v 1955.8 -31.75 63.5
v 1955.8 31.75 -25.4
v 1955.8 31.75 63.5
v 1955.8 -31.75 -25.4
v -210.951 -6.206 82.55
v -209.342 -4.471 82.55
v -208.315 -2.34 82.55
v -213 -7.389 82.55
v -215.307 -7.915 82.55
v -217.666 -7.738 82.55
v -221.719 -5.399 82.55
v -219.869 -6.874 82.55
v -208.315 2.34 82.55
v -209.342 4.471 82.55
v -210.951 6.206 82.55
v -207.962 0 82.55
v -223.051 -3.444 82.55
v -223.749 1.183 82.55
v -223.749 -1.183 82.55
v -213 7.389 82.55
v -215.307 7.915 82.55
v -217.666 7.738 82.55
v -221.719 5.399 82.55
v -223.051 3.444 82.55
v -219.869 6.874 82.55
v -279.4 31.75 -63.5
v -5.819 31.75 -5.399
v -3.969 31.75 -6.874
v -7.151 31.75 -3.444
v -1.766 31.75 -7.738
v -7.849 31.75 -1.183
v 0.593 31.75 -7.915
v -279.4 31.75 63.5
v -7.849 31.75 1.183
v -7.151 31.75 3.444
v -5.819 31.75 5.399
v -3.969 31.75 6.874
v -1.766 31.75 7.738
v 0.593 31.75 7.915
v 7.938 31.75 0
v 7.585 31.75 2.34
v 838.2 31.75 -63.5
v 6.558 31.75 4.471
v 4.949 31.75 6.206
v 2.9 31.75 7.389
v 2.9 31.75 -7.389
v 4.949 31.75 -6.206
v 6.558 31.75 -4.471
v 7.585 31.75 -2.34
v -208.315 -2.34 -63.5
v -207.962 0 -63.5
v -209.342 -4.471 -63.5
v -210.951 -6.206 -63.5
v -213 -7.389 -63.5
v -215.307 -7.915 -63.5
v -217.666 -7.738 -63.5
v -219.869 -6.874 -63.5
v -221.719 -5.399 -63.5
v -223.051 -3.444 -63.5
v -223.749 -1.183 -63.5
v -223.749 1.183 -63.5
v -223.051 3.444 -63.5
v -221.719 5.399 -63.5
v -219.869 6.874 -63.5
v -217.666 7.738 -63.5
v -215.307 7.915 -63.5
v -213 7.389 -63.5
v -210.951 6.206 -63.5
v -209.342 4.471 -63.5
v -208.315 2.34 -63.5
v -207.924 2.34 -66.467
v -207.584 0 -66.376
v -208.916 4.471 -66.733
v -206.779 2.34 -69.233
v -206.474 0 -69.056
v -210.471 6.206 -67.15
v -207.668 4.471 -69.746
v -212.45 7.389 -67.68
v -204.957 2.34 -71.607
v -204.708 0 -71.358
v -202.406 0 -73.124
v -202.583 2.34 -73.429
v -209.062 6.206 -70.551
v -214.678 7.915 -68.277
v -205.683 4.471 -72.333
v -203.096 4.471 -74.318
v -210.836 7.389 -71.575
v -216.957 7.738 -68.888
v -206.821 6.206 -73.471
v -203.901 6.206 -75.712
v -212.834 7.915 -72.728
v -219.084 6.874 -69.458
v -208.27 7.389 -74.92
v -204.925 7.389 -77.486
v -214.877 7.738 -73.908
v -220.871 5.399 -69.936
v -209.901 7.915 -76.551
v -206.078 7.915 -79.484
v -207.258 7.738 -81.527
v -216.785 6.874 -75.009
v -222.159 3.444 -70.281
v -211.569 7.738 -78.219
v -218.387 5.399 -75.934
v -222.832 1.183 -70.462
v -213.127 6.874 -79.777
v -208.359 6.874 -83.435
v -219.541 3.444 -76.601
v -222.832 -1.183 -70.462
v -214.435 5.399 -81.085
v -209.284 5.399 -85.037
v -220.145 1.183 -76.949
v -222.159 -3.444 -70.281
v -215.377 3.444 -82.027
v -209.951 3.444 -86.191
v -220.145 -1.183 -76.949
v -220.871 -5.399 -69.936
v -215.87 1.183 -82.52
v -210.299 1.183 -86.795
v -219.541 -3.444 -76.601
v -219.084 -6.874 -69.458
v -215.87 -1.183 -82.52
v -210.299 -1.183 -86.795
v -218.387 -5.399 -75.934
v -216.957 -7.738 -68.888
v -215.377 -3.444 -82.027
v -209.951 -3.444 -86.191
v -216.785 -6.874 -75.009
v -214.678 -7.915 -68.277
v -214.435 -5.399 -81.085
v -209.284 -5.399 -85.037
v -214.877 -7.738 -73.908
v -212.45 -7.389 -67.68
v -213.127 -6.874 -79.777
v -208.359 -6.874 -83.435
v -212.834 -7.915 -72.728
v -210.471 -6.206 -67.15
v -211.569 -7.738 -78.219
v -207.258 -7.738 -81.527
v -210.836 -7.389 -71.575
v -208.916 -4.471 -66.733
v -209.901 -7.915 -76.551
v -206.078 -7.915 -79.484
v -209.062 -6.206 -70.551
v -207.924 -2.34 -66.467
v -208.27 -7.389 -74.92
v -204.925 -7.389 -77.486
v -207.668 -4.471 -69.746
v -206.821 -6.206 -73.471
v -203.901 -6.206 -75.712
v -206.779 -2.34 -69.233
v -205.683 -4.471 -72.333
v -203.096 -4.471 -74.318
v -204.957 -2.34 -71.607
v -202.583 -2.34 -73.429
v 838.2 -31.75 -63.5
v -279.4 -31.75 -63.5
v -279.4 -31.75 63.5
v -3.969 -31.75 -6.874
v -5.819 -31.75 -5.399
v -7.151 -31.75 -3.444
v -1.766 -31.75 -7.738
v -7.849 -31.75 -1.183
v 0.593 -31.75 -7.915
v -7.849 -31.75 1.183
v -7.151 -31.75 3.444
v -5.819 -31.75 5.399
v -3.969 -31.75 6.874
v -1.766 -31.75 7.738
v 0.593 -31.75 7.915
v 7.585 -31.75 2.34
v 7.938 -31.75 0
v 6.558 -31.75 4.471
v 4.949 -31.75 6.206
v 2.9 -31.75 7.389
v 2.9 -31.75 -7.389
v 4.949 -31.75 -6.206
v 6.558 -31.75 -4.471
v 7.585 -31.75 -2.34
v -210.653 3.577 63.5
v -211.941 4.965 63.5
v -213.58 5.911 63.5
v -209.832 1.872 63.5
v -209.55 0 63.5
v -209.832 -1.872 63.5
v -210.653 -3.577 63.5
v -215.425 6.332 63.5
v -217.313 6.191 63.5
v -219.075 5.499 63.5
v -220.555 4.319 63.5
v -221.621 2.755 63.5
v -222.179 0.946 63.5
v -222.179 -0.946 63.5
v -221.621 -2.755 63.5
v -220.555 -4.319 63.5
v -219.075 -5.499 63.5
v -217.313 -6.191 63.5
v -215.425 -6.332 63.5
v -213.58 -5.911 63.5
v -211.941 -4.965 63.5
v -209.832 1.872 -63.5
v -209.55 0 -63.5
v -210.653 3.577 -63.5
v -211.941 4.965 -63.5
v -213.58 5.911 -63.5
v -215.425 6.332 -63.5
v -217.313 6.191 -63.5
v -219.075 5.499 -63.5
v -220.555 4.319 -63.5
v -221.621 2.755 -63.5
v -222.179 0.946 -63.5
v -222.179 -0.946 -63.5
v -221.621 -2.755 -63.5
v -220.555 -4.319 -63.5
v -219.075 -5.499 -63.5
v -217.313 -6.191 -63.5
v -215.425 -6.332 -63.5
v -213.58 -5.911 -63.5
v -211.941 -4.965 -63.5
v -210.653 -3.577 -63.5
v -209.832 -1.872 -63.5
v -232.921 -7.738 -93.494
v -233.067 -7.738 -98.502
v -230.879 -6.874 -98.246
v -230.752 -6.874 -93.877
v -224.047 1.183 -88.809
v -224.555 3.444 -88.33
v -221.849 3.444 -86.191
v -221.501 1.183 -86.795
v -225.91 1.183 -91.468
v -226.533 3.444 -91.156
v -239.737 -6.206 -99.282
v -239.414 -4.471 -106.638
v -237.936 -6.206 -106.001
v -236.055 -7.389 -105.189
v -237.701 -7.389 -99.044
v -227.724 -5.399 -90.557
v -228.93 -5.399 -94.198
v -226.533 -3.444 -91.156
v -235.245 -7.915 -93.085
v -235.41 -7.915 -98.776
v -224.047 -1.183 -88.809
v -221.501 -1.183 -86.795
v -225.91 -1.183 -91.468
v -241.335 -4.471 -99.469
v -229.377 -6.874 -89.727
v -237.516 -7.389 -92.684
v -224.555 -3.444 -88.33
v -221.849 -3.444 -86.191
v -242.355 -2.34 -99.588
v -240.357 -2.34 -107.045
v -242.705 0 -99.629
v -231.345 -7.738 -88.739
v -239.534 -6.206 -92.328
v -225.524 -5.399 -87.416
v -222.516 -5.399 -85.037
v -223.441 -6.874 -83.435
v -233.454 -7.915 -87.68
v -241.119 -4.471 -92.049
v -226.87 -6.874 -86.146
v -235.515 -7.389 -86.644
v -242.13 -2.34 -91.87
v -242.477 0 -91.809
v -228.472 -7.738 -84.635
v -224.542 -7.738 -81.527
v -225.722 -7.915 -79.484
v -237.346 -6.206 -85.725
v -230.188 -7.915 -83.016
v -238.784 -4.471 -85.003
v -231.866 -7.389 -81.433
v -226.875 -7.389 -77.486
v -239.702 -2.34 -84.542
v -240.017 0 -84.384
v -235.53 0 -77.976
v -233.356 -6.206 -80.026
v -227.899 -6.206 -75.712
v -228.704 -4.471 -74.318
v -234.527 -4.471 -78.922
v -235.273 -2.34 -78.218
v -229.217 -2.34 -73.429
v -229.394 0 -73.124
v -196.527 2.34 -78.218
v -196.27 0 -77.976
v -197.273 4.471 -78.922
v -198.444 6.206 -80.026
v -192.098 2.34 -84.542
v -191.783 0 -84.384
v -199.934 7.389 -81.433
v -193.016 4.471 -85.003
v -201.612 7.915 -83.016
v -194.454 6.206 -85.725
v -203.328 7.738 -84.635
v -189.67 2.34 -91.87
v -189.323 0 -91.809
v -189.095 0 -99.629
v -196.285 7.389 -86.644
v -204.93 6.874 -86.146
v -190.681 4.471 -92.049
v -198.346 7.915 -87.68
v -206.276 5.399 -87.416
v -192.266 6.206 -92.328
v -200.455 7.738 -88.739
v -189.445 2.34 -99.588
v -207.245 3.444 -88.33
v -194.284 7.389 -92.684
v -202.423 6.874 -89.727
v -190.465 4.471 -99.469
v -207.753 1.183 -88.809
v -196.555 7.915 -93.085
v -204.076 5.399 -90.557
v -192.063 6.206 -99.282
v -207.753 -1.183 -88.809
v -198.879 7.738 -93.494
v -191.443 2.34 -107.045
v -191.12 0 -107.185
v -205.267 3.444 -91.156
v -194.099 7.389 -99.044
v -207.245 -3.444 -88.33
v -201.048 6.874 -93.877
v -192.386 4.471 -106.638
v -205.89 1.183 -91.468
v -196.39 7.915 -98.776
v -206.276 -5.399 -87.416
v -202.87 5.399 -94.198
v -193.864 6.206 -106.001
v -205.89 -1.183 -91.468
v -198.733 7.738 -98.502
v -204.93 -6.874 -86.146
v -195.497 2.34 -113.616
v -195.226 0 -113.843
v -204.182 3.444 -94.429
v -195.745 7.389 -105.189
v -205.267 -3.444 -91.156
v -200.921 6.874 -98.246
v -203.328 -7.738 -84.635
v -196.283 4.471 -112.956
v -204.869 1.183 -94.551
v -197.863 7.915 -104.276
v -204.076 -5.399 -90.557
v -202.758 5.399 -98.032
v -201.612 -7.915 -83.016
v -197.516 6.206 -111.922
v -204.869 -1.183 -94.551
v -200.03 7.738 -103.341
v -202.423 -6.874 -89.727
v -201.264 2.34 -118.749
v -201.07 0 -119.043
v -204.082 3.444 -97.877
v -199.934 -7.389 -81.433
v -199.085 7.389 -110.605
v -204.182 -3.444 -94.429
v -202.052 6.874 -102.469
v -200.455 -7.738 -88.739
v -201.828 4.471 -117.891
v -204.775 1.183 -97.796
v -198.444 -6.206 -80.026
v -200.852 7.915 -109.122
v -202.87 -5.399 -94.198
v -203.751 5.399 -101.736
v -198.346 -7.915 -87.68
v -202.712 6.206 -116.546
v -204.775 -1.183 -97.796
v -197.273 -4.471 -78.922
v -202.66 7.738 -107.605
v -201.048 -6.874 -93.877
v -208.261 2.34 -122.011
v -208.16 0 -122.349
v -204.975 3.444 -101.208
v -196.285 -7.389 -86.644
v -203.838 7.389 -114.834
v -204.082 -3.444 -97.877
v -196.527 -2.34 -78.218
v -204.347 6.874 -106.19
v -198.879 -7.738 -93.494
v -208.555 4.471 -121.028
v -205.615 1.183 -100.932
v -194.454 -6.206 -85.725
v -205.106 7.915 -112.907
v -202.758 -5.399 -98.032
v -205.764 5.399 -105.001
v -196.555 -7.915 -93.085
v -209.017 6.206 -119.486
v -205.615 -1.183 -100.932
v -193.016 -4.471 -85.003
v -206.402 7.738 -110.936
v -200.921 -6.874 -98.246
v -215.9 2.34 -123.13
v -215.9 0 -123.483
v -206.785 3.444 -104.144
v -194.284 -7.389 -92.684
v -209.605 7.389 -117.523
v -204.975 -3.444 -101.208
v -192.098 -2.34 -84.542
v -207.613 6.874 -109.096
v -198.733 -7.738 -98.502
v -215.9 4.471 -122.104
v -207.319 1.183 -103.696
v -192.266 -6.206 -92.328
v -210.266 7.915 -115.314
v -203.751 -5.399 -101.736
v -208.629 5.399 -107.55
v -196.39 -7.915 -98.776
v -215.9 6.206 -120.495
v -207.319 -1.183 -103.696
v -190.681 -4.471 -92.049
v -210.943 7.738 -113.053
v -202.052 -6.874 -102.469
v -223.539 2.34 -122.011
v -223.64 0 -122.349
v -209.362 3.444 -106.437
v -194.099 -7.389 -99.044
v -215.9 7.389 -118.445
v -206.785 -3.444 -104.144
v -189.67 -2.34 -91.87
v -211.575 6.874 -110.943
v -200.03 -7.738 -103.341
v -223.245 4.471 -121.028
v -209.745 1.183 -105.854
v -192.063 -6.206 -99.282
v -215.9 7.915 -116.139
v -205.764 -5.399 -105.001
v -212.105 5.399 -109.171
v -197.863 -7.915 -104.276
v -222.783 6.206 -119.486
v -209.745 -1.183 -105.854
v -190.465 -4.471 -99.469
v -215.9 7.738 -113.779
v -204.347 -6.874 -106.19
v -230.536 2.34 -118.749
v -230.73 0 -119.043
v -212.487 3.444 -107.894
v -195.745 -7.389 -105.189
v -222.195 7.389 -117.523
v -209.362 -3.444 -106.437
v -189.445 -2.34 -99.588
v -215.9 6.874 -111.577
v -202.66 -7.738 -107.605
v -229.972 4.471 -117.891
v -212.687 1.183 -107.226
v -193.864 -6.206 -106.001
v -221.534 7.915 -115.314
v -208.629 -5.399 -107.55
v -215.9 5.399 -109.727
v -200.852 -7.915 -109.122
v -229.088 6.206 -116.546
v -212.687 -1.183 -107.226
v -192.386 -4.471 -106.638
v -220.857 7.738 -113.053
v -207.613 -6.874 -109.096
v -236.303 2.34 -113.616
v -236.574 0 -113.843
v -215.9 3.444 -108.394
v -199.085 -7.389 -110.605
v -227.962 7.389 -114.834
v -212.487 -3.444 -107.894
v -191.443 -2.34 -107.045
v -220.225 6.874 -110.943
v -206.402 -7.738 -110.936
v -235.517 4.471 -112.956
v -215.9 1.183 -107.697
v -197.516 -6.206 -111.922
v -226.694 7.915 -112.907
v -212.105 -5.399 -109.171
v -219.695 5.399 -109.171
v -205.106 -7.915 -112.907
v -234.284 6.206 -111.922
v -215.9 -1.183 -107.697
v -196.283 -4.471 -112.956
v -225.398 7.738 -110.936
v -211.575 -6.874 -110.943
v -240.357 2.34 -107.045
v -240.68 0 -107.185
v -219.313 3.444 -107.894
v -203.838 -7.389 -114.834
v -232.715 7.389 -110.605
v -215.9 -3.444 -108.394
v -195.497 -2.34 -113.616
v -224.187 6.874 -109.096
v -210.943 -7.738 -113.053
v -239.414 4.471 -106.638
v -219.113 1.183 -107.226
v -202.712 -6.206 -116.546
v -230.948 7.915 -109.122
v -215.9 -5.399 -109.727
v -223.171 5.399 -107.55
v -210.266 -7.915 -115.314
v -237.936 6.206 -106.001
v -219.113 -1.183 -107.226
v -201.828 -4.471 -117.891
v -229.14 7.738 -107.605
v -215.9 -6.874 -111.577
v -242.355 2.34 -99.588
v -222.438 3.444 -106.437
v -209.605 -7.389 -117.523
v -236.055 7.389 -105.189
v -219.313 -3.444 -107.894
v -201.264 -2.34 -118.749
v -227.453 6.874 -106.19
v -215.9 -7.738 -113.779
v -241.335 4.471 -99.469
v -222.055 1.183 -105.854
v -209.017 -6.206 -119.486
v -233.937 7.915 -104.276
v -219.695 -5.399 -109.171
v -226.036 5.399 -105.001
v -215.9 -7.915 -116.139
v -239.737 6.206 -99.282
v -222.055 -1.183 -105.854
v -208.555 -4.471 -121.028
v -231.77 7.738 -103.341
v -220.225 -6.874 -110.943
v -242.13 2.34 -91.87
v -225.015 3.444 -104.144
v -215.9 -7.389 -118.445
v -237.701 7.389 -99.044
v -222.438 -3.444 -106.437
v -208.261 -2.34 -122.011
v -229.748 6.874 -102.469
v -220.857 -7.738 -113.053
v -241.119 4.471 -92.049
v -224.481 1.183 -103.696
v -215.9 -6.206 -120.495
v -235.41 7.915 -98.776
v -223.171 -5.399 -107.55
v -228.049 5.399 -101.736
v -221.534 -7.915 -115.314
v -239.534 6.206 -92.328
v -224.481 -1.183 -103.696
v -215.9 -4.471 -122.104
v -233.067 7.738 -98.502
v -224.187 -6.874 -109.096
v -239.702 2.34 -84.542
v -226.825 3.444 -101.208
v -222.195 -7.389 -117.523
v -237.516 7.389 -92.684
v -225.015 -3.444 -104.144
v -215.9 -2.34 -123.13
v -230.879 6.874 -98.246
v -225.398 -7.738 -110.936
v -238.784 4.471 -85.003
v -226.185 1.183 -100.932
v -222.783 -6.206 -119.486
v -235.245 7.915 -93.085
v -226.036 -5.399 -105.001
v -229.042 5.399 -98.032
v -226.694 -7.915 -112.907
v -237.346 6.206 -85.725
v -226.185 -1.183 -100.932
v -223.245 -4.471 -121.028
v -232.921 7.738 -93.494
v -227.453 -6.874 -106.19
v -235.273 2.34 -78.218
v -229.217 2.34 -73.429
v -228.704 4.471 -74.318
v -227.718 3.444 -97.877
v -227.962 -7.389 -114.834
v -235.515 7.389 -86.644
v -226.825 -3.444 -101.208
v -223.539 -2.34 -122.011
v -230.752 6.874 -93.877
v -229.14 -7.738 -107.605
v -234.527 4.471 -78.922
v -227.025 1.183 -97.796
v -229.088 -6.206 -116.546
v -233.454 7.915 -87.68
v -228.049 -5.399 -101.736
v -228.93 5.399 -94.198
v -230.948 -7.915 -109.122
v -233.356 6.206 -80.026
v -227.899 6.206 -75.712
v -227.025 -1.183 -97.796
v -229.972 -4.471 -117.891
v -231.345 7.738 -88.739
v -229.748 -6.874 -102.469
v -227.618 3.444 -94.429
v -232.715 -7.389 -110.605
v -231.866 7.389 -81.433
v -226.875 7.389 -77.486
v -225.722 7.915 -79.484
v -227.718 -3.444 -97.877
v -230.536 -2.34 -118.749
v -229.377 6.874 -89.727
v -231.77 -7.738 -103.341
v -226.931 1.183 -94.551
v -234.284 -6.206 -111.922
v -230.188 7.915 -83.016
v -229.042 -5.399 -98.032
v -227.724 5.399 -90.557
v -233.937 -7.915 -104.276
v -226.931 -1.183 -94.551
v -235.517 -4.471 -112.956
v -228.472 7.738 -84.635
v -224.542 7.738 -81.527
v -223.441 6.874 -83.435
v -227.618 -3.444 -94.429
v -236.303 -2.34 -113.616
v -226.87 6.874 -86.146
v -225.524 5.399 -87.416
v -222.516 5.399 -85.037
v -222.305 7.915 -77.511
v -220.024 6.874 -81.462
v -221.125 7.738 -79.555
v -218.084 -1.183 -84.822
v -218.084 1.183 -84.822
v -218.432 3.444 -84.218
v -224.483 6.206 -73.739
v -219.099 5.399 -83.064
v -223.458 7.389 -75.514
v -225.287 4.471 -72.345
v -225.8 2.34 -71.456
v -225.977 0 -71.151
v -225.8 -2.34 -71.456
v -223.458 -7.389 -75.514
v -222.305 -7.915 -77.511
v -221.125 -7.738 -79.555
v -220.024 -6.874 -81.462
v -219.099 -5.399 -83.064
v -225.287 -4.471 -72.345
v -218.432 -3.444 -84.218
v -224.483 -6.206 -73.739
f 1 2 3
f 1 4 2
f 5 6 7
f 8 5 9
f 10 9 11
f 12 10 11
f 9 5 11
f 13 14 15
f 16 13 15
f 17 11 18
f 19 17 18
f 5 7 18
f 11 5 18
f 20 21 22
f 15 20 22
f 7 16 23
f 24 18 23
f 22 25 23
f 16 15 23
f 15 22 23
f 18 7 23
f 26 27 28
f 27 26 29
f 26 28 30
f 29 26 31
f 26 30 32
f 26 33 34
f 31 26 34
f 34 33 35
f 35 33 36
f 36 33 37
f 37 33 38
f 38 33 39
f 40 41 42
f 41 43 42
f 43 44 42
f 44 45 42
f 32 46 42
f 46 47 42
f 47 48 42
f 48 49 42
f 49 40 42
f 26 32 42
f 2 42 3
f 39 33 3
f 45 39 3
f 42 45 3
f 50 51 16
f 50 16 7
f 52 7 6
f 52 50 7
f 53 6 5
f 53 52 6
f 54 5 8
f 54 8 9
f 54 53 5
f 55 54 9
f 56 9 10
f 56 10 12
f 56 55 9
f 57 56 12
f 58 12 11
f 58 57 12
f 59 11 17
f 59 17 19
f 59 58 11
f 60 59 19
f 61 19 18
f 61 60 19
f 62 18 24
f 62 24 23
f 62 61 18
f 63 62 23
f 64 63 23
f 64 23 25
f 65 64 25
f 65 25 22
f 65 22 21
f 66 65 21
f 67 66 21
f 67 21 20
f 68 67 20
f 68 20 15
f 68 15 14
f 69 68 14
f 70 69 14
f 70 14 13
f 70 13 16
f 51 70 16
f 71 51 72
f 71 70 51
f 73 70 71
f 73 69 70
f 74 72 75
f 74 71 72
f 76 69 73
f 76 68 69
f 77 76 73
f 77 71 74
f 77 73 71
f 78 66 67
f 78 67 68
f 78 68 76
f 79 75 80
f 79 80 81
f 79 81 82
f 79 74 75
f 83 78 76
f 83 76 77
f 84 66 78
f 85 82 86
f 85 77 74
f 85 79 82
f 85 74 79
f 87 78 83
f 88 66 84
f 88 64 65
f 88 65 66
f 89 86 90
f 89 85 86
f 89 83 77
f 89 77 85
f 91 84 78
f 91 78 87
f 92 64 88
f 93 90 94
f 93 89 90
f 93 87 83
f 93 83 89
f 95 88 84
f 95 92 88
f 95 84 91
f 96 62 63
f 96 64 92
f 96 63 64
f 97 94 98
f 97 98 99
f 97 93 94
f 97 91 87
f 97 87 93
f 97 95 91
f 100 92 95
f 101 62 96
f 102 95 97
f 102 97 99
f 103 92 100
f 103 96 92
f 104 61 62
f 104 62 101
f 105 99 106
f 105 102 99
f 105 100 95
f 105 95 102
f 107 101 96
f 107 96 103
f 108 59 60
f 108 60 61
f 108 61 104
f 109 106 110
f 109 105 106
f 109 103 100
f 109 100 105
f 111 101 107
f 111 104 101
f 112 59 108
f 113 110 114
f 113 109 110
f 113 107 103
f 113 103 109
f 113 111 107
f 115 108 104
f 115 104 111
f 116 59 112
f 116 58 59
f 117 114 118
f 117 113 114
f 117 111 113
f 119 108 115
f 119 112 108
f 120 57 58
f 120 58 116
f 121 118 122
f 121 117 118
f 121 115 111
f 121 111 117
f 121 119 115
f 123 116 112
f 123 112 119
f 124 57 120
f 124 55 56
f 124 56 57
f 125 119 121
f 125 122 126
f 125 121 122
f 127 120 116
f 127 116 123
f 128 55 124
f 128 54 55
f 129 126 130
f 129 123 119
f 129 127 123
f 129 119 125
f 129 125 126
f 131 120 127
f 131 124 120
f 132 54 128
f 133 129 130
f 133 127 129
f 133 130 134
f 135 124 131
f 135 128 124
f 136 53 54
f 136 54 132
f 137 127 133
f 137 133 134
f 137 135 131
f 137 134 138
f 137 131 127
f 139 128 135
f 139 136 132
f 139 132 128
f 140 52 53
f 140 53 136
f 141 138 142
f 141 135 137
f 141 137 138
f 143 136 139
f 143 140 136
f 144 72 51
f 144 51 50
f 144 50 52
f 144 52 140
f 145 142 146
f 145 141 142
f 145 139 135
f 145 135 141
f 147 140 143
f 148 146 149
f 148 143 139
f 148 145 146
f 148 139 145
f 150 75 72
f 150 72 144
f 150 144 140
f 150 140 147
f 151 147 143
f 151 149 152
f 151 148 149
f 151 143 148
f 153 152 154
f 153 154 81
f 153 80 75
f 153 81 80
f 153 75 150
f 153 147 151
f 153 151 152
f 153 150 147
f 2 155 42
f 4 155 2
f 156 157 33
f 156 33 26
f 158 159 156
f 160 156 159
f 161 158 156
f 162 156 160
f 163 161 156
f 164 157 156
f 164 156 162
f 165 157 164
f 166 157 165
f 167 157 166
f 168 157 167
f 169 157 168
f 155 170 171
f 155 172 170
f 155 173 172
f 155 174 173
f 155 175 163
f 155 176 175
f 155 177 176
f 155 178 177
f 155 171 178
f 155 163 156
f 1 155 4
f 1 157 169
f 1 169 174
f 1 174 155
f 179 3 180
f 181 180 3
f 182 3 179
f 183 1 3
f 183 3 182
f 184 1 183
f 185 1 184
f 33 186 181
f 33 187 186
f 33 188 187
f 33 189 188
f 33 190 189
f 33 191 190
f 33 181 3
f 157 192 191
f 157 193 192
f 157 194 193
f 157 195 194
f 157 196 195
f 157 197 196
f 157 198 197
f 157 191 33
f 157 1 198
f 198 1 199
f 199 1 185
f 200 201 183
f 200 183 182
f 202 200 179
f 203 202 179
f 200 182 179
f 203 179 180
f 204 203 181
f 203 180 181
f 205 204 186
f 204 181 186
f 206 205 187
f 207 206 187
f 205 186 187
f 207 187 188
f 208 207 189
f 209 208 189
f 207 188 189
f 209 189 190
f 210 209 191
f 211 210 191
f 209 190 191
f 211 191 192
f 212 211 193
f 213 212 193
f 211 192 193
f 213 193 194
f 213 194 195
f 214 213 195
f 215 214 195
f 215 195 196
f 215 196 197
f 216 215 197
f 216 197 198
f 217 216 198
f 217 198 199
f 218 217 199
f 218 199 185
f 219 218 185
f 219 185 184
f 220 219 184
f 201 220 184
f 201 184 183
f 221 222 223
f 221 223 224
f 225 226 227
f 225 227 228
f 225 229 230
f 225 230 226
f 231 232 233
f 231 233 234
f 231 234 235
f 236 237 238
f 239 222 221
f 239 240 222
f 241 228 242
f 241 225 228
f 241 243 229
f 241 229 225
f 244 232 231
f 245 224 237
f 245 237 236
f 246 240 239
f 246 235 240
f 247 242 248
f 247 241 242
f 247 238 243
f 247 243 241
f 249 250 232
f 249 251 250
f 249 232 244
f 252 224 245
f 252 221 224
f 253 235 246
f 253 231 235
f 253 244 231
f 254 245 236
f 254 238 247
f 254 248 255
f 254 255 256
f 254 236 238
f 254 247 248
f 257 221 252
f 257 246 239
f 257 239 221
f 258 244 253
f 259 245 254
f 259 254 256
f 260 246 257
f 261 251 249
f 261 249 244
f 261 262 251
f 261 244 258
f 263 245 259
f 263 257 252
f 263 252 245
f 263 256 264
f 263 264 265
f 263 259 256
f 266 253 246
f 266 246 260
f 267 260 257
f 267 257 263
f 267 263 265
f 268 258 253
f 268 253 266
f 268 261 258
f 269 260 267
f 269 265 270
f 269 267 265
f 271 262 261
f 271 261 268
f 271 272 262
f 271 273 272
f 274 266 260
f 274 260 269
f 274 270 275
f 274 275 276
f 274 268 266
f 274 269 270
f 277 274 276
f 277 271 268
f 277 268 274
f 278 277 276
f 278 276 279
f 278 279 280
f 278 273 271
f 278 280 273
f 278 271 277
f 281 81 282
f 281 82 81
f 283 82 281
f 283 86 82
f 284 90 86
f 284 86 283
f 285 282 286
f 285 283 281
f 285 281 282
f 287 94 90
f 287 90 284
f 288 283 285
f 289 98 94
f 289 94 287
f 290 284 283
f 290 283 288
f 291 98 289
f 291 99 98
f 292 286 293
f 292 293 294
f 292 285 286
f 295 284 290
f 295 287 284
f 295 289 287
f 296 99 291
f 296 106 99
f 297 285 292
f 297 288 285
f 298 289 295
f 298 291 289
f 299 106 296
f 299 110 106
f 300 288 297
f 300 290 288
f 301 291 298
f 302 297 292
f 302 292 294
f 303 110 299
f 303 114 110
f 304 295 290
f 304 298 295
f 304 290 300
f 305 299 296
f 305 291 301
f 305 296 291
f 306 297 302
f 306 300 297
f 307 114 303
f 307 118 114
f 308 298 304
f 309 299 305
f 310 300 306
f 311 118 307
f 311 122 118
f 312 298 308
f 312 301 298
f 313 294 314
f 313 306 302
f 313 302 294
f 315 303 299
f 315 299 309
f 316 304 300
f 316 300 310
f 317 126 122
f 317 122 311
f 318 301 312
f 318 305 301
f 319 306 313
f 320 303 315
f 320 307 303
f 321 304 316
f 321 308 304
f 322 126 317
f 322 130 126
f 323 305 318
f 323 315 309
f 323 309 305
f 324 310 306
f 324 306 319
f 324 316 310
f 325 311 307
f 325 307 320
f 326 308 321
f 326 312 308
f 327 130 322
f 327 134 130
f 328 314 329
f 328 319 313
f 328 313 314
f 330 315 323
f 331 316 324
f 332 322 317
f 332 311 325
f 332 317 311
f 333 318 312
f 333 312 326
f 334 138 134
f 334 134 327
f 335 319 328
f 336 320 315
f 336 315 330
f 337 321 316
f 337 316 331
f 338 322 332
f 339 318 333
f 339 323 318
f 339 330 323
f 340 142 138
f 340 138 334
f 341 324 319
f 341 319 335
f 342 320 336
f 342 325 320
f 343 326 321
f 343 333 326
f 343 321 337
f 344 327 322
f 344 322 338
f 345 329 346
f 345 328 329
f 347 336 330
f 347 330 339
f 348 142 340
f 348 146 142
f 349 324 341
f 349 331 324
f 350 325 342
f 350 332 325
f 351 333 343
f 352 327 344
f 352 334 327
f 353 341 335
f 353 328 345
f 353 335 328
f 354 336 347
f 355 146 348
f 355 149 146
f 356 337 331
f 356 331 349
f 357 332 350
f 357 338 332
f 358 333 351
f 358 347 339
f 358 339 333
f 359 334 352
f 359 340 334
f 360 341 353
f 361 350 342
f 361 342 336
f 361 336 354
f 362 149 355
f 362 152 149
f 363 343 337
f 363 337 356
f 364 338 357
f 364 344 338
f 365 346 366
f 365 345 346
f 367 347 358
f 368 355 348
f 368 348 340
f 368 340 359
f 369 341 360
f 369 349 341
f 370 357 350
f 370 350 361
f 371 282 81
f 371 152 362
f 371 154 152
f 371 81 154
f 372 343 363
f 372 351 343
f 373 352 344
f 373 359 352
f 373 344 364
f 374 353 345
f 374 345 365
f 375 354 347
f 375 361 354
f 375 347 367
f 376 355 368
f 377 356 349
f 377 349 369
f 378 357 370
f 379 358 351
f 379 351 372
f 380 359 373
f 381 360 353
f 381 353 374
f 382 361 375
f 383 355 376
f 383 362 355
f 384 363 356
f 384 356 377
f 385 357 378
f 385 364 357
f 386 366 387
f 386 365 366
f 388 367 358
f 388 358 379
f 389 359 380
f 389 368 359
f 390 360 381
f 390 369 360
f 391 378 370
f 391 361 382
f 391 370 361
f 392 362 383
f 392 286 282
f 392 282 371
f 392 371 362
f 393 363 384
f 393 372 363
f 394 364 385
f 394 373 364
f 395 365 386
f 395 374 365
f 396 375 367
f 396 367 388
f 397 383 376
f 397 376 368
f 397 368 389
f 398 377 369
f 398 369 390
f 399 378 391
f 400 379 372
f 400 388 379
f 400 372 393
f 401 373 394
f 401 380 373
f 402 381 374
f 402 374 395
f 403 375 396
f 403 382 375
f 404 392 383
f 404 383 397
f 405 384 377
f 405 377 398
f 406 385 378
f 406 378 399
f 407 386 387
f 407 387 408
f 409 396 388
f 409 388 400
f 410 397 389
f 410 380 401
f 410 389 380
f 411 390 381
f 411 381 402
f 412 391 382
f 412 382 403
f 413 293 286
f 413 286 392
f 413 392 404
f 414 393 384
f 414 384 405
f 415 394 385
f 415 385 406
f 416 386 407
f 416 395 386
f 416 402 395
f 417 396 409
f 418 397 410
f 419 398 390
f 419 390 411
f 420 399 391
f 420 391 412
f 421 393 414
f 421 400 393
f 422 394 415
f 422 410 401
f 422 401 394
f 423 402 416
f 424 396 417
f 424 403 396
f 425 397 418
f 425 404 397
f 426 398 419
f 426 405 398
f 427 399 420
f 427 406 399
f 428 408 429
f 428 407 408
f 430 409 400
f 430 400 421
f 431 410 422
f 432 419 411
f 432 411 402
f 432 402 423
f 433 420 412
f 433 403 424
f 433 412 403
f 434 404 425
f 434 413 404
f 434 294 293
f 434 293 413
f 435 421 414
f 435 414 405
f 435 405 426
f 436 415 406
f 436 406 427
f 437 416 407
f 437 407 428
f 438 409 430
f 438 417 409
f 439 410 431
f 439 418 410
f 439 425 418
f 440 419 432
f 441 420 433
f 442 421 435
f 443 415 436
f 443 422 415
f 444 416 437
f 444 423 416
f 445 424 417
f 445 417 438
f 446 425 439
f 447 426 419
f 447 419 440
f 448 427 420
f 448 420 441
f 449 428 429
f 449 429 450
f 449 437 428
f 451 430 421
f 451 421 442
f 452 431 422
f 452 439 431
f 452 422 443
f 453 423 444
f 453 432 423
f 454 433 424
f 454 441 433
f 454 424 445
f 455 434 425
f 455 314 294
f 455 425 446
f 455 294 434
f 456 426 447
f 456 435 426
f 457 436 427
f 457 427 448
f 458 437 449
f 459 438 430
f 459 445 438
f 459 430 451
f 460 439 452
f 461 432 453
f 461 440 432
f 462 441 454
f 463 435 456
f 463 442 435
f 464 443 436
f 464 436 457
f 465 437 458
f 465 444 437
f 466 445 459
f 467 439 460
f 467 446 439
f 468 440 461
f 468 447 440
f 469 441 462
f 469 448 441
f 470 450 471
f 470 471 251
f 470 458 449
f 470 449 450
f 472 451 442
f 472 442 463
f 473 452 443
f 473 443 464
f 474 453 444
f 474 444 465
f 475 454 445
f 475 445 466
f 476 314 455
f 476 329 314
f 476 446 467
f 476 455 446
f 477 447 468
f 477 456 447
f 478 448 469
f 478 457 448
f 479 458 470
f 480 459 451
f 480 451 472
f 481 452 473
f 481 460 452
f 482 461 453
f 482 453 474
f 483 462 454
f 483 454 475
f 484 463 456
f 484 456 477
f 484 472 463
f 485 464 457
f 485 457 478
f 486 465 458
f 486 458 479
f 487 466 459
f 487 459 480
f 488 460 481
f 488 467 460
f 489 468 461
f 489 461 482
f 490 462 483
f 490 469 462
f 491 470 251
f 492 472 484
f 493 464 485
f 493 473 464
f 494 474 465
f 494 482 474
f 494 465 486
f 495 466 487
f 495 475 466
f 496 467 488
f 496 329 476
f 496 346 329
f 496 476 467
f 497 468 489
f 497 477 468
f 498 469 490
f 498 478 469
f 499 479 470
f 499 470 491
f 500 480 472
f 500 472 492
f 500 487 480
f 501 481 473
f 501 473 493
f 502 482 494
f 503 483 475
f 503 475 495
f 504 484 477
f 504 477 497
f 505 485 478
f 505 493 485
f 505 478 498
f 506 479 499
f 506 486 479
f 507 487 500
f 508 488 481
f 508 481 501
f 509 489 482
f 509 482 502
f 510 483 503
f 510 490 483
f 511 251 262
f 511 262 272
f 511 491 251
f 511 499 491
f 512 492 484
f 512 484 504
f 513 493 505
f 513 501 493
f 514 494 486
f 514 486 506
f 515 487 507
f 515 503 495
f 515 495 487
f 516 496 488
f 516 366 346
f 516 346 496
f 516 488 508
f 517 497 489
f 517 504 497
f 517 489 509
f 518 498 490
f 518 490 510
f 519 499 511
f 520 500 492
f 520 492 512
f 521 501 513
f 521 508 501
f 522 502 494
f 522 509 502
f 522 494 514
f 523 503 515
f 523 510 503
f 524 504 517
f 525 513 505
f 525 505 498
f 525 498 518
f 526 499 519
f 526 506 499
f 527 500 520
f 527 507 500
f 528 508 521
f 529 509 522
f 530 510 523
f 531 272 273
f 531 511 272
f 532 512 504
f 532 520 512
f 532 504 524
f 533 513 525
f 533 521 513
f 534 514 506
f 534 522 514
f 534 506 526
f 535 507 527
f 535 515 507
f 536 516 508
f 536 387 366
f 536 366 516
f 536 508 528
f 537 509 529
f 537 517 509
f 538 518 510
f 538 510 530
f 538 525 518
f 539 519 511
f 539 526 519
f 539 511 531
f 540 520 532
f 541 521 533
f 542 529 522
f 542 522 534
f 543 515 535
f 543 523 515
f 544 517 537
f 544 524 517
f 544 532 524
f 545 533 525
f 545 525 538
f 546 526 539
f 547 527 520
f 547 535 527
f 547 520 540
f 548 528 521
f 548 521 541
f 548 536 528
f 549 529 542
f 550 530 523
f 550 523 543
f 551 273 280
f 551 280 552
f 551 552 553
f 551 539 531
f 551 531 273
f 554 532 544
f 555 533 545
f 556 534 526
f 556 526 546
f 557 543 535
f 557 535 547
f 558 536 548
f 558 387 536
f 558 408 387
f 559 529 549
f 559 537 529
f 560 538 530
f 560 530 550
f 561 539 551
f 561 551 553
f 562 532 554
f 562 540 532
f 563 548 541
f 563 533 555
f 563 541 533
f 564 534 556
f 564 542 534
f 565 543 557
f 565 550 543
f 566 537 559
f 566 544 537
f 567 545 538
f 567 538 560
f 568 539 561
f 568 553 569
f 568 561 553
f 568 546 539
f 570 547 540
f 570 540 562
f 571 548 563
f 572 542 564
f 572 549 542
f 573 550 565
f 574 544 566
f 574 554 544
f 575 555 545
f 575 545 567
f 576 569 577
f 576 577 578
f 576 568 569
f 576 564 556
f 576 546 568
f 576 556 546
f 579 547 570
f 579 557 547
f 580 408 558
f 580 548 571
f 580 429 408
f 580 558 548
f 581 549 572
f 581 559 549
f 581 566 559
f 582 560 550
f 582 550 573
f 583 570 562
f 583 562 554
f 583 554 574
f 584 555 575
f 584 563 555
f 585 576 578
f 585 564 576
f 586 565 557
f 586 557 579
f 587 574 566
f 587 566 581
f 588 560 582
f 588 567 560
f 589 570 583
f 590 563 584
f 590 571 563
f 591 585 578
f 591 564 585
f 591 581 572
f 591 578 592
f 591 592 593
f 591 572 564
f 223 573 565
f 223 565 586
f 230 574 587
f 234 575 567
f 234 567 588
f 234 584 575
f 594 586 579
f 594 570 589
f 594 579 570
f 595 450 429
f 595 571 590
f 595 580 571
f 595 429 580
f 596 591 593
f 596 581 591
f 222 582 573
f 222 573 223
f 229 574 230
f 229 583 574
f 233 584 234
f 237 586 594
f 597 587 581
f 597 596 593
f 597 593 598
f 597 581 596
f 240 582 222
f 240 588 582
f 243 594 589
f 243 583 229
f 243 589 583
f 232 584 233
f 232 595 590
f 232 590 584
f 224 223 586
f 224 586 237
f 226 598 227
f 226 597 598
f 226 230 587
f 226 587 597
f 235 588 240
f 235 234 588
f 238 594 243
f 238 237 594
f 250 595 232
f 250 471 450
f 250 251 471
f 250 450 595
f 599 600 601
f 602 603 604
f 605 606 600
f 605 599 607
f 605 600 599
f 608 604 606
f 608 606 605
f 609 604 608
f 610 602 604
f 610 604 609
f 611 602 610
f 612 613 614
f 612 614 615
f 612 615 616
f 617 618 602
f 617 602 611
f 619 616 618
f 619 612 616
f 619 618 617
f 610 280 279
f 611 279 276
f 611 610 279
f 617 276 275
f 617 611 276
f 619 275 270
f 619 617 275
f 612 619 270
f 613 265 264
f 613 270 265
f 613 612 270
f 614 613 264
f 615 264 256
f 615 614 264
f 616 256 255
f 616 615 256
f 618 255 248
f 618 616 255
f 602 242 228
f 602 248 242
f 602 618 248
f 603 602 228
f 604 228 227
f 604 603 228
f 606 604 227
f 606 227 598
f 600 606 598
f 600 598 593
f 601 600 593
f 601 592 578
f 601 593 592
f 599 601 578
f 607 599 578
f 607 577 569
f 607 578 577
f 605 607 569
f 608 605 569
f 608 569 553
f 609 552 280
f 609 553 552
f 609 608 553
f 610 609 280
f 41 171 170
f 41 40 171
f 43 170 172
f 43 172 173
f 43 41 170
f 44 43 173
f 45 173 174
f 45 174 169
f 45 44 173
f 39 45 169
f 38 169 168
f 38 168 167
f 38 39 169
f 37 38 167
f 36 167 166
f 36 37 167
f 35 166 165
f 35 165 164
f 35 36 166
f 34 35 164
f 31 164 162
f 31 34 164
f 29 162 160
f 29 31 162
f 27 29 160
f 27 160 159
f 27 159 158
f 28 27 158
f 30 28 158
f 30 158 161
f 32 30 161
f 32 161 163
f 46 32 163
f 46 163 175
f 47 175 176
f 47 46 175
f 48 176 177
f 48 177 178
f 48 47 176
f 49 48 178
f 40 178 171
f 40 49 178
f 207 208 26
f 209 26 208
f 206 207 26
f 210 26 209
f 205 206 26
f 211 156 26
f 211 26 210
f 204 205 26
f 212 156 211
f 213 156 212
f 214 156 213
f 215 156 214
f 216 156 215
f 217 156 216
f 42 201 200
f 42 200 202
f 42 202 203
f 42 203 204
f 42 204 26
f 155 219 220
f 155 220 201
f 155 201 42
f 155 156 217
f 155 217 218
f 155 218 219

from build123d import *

# Parameters (mm, degrees)
F0_R     = 7.9375
F1_DEPTH = 31.75
F2_R     = 6.35
F3_DEPTH = 127.001
F6_R     = 7.9375


with BuildPart() as f1:
    # F0 (on Front) → F1 (new body, symmetric)
    with BuildSketch(Plane.XZ):
        Polygon((1955.8, 63.5), (-279.4, 63.5), (-279.4, -63.5), (838.2, -63.5), (1955.8, -25.4), align=None)
        Circle(F0_R, mode=Mode.SUBTRACT)
    extrude(amount=F1_DEPTH, both=True)

    # F2 (on face) → F3 (cut, through all)
    with BuildSketch(Plane.XY.offset(63.5)):
        with Locations((-215.9, 0)):
            Circle(F2_R)
    extrude(amount=-F3_DEPTH, mode=Mode.SUBTRACT)


with BuildPart() as f7:
    # F7: sweep along a path in F4
    with BuildLine(Plane.XZ) as f7_path:
        Line((-215.9, 82.55), (-215.9, -63.5))
        ThreePointArc((-215.9, -63.5), (-213.3477839421, -73.025), (-206.375, -79.9977839421))
        ThreePointArc((-206.375, -79.9977839421), (-215.9, -115.5455678842), (-225.425, -79.9977839421))
        Line((-225.425, -79.9977839421), (-222.0080379799, -78.025))
    # F6 (on line) → F7 (sweep)
    with BuildSketch(Plane(origin=(0, 0, 82.55), x_dir=(1, 0, 0), z_dir=(0, 0, -1))):
        with Locations((-215.9, 0)):
            Circle(F6_R)
    sweep(path=f7_path.line)


solid = Compound([f1.part, f7.part])
